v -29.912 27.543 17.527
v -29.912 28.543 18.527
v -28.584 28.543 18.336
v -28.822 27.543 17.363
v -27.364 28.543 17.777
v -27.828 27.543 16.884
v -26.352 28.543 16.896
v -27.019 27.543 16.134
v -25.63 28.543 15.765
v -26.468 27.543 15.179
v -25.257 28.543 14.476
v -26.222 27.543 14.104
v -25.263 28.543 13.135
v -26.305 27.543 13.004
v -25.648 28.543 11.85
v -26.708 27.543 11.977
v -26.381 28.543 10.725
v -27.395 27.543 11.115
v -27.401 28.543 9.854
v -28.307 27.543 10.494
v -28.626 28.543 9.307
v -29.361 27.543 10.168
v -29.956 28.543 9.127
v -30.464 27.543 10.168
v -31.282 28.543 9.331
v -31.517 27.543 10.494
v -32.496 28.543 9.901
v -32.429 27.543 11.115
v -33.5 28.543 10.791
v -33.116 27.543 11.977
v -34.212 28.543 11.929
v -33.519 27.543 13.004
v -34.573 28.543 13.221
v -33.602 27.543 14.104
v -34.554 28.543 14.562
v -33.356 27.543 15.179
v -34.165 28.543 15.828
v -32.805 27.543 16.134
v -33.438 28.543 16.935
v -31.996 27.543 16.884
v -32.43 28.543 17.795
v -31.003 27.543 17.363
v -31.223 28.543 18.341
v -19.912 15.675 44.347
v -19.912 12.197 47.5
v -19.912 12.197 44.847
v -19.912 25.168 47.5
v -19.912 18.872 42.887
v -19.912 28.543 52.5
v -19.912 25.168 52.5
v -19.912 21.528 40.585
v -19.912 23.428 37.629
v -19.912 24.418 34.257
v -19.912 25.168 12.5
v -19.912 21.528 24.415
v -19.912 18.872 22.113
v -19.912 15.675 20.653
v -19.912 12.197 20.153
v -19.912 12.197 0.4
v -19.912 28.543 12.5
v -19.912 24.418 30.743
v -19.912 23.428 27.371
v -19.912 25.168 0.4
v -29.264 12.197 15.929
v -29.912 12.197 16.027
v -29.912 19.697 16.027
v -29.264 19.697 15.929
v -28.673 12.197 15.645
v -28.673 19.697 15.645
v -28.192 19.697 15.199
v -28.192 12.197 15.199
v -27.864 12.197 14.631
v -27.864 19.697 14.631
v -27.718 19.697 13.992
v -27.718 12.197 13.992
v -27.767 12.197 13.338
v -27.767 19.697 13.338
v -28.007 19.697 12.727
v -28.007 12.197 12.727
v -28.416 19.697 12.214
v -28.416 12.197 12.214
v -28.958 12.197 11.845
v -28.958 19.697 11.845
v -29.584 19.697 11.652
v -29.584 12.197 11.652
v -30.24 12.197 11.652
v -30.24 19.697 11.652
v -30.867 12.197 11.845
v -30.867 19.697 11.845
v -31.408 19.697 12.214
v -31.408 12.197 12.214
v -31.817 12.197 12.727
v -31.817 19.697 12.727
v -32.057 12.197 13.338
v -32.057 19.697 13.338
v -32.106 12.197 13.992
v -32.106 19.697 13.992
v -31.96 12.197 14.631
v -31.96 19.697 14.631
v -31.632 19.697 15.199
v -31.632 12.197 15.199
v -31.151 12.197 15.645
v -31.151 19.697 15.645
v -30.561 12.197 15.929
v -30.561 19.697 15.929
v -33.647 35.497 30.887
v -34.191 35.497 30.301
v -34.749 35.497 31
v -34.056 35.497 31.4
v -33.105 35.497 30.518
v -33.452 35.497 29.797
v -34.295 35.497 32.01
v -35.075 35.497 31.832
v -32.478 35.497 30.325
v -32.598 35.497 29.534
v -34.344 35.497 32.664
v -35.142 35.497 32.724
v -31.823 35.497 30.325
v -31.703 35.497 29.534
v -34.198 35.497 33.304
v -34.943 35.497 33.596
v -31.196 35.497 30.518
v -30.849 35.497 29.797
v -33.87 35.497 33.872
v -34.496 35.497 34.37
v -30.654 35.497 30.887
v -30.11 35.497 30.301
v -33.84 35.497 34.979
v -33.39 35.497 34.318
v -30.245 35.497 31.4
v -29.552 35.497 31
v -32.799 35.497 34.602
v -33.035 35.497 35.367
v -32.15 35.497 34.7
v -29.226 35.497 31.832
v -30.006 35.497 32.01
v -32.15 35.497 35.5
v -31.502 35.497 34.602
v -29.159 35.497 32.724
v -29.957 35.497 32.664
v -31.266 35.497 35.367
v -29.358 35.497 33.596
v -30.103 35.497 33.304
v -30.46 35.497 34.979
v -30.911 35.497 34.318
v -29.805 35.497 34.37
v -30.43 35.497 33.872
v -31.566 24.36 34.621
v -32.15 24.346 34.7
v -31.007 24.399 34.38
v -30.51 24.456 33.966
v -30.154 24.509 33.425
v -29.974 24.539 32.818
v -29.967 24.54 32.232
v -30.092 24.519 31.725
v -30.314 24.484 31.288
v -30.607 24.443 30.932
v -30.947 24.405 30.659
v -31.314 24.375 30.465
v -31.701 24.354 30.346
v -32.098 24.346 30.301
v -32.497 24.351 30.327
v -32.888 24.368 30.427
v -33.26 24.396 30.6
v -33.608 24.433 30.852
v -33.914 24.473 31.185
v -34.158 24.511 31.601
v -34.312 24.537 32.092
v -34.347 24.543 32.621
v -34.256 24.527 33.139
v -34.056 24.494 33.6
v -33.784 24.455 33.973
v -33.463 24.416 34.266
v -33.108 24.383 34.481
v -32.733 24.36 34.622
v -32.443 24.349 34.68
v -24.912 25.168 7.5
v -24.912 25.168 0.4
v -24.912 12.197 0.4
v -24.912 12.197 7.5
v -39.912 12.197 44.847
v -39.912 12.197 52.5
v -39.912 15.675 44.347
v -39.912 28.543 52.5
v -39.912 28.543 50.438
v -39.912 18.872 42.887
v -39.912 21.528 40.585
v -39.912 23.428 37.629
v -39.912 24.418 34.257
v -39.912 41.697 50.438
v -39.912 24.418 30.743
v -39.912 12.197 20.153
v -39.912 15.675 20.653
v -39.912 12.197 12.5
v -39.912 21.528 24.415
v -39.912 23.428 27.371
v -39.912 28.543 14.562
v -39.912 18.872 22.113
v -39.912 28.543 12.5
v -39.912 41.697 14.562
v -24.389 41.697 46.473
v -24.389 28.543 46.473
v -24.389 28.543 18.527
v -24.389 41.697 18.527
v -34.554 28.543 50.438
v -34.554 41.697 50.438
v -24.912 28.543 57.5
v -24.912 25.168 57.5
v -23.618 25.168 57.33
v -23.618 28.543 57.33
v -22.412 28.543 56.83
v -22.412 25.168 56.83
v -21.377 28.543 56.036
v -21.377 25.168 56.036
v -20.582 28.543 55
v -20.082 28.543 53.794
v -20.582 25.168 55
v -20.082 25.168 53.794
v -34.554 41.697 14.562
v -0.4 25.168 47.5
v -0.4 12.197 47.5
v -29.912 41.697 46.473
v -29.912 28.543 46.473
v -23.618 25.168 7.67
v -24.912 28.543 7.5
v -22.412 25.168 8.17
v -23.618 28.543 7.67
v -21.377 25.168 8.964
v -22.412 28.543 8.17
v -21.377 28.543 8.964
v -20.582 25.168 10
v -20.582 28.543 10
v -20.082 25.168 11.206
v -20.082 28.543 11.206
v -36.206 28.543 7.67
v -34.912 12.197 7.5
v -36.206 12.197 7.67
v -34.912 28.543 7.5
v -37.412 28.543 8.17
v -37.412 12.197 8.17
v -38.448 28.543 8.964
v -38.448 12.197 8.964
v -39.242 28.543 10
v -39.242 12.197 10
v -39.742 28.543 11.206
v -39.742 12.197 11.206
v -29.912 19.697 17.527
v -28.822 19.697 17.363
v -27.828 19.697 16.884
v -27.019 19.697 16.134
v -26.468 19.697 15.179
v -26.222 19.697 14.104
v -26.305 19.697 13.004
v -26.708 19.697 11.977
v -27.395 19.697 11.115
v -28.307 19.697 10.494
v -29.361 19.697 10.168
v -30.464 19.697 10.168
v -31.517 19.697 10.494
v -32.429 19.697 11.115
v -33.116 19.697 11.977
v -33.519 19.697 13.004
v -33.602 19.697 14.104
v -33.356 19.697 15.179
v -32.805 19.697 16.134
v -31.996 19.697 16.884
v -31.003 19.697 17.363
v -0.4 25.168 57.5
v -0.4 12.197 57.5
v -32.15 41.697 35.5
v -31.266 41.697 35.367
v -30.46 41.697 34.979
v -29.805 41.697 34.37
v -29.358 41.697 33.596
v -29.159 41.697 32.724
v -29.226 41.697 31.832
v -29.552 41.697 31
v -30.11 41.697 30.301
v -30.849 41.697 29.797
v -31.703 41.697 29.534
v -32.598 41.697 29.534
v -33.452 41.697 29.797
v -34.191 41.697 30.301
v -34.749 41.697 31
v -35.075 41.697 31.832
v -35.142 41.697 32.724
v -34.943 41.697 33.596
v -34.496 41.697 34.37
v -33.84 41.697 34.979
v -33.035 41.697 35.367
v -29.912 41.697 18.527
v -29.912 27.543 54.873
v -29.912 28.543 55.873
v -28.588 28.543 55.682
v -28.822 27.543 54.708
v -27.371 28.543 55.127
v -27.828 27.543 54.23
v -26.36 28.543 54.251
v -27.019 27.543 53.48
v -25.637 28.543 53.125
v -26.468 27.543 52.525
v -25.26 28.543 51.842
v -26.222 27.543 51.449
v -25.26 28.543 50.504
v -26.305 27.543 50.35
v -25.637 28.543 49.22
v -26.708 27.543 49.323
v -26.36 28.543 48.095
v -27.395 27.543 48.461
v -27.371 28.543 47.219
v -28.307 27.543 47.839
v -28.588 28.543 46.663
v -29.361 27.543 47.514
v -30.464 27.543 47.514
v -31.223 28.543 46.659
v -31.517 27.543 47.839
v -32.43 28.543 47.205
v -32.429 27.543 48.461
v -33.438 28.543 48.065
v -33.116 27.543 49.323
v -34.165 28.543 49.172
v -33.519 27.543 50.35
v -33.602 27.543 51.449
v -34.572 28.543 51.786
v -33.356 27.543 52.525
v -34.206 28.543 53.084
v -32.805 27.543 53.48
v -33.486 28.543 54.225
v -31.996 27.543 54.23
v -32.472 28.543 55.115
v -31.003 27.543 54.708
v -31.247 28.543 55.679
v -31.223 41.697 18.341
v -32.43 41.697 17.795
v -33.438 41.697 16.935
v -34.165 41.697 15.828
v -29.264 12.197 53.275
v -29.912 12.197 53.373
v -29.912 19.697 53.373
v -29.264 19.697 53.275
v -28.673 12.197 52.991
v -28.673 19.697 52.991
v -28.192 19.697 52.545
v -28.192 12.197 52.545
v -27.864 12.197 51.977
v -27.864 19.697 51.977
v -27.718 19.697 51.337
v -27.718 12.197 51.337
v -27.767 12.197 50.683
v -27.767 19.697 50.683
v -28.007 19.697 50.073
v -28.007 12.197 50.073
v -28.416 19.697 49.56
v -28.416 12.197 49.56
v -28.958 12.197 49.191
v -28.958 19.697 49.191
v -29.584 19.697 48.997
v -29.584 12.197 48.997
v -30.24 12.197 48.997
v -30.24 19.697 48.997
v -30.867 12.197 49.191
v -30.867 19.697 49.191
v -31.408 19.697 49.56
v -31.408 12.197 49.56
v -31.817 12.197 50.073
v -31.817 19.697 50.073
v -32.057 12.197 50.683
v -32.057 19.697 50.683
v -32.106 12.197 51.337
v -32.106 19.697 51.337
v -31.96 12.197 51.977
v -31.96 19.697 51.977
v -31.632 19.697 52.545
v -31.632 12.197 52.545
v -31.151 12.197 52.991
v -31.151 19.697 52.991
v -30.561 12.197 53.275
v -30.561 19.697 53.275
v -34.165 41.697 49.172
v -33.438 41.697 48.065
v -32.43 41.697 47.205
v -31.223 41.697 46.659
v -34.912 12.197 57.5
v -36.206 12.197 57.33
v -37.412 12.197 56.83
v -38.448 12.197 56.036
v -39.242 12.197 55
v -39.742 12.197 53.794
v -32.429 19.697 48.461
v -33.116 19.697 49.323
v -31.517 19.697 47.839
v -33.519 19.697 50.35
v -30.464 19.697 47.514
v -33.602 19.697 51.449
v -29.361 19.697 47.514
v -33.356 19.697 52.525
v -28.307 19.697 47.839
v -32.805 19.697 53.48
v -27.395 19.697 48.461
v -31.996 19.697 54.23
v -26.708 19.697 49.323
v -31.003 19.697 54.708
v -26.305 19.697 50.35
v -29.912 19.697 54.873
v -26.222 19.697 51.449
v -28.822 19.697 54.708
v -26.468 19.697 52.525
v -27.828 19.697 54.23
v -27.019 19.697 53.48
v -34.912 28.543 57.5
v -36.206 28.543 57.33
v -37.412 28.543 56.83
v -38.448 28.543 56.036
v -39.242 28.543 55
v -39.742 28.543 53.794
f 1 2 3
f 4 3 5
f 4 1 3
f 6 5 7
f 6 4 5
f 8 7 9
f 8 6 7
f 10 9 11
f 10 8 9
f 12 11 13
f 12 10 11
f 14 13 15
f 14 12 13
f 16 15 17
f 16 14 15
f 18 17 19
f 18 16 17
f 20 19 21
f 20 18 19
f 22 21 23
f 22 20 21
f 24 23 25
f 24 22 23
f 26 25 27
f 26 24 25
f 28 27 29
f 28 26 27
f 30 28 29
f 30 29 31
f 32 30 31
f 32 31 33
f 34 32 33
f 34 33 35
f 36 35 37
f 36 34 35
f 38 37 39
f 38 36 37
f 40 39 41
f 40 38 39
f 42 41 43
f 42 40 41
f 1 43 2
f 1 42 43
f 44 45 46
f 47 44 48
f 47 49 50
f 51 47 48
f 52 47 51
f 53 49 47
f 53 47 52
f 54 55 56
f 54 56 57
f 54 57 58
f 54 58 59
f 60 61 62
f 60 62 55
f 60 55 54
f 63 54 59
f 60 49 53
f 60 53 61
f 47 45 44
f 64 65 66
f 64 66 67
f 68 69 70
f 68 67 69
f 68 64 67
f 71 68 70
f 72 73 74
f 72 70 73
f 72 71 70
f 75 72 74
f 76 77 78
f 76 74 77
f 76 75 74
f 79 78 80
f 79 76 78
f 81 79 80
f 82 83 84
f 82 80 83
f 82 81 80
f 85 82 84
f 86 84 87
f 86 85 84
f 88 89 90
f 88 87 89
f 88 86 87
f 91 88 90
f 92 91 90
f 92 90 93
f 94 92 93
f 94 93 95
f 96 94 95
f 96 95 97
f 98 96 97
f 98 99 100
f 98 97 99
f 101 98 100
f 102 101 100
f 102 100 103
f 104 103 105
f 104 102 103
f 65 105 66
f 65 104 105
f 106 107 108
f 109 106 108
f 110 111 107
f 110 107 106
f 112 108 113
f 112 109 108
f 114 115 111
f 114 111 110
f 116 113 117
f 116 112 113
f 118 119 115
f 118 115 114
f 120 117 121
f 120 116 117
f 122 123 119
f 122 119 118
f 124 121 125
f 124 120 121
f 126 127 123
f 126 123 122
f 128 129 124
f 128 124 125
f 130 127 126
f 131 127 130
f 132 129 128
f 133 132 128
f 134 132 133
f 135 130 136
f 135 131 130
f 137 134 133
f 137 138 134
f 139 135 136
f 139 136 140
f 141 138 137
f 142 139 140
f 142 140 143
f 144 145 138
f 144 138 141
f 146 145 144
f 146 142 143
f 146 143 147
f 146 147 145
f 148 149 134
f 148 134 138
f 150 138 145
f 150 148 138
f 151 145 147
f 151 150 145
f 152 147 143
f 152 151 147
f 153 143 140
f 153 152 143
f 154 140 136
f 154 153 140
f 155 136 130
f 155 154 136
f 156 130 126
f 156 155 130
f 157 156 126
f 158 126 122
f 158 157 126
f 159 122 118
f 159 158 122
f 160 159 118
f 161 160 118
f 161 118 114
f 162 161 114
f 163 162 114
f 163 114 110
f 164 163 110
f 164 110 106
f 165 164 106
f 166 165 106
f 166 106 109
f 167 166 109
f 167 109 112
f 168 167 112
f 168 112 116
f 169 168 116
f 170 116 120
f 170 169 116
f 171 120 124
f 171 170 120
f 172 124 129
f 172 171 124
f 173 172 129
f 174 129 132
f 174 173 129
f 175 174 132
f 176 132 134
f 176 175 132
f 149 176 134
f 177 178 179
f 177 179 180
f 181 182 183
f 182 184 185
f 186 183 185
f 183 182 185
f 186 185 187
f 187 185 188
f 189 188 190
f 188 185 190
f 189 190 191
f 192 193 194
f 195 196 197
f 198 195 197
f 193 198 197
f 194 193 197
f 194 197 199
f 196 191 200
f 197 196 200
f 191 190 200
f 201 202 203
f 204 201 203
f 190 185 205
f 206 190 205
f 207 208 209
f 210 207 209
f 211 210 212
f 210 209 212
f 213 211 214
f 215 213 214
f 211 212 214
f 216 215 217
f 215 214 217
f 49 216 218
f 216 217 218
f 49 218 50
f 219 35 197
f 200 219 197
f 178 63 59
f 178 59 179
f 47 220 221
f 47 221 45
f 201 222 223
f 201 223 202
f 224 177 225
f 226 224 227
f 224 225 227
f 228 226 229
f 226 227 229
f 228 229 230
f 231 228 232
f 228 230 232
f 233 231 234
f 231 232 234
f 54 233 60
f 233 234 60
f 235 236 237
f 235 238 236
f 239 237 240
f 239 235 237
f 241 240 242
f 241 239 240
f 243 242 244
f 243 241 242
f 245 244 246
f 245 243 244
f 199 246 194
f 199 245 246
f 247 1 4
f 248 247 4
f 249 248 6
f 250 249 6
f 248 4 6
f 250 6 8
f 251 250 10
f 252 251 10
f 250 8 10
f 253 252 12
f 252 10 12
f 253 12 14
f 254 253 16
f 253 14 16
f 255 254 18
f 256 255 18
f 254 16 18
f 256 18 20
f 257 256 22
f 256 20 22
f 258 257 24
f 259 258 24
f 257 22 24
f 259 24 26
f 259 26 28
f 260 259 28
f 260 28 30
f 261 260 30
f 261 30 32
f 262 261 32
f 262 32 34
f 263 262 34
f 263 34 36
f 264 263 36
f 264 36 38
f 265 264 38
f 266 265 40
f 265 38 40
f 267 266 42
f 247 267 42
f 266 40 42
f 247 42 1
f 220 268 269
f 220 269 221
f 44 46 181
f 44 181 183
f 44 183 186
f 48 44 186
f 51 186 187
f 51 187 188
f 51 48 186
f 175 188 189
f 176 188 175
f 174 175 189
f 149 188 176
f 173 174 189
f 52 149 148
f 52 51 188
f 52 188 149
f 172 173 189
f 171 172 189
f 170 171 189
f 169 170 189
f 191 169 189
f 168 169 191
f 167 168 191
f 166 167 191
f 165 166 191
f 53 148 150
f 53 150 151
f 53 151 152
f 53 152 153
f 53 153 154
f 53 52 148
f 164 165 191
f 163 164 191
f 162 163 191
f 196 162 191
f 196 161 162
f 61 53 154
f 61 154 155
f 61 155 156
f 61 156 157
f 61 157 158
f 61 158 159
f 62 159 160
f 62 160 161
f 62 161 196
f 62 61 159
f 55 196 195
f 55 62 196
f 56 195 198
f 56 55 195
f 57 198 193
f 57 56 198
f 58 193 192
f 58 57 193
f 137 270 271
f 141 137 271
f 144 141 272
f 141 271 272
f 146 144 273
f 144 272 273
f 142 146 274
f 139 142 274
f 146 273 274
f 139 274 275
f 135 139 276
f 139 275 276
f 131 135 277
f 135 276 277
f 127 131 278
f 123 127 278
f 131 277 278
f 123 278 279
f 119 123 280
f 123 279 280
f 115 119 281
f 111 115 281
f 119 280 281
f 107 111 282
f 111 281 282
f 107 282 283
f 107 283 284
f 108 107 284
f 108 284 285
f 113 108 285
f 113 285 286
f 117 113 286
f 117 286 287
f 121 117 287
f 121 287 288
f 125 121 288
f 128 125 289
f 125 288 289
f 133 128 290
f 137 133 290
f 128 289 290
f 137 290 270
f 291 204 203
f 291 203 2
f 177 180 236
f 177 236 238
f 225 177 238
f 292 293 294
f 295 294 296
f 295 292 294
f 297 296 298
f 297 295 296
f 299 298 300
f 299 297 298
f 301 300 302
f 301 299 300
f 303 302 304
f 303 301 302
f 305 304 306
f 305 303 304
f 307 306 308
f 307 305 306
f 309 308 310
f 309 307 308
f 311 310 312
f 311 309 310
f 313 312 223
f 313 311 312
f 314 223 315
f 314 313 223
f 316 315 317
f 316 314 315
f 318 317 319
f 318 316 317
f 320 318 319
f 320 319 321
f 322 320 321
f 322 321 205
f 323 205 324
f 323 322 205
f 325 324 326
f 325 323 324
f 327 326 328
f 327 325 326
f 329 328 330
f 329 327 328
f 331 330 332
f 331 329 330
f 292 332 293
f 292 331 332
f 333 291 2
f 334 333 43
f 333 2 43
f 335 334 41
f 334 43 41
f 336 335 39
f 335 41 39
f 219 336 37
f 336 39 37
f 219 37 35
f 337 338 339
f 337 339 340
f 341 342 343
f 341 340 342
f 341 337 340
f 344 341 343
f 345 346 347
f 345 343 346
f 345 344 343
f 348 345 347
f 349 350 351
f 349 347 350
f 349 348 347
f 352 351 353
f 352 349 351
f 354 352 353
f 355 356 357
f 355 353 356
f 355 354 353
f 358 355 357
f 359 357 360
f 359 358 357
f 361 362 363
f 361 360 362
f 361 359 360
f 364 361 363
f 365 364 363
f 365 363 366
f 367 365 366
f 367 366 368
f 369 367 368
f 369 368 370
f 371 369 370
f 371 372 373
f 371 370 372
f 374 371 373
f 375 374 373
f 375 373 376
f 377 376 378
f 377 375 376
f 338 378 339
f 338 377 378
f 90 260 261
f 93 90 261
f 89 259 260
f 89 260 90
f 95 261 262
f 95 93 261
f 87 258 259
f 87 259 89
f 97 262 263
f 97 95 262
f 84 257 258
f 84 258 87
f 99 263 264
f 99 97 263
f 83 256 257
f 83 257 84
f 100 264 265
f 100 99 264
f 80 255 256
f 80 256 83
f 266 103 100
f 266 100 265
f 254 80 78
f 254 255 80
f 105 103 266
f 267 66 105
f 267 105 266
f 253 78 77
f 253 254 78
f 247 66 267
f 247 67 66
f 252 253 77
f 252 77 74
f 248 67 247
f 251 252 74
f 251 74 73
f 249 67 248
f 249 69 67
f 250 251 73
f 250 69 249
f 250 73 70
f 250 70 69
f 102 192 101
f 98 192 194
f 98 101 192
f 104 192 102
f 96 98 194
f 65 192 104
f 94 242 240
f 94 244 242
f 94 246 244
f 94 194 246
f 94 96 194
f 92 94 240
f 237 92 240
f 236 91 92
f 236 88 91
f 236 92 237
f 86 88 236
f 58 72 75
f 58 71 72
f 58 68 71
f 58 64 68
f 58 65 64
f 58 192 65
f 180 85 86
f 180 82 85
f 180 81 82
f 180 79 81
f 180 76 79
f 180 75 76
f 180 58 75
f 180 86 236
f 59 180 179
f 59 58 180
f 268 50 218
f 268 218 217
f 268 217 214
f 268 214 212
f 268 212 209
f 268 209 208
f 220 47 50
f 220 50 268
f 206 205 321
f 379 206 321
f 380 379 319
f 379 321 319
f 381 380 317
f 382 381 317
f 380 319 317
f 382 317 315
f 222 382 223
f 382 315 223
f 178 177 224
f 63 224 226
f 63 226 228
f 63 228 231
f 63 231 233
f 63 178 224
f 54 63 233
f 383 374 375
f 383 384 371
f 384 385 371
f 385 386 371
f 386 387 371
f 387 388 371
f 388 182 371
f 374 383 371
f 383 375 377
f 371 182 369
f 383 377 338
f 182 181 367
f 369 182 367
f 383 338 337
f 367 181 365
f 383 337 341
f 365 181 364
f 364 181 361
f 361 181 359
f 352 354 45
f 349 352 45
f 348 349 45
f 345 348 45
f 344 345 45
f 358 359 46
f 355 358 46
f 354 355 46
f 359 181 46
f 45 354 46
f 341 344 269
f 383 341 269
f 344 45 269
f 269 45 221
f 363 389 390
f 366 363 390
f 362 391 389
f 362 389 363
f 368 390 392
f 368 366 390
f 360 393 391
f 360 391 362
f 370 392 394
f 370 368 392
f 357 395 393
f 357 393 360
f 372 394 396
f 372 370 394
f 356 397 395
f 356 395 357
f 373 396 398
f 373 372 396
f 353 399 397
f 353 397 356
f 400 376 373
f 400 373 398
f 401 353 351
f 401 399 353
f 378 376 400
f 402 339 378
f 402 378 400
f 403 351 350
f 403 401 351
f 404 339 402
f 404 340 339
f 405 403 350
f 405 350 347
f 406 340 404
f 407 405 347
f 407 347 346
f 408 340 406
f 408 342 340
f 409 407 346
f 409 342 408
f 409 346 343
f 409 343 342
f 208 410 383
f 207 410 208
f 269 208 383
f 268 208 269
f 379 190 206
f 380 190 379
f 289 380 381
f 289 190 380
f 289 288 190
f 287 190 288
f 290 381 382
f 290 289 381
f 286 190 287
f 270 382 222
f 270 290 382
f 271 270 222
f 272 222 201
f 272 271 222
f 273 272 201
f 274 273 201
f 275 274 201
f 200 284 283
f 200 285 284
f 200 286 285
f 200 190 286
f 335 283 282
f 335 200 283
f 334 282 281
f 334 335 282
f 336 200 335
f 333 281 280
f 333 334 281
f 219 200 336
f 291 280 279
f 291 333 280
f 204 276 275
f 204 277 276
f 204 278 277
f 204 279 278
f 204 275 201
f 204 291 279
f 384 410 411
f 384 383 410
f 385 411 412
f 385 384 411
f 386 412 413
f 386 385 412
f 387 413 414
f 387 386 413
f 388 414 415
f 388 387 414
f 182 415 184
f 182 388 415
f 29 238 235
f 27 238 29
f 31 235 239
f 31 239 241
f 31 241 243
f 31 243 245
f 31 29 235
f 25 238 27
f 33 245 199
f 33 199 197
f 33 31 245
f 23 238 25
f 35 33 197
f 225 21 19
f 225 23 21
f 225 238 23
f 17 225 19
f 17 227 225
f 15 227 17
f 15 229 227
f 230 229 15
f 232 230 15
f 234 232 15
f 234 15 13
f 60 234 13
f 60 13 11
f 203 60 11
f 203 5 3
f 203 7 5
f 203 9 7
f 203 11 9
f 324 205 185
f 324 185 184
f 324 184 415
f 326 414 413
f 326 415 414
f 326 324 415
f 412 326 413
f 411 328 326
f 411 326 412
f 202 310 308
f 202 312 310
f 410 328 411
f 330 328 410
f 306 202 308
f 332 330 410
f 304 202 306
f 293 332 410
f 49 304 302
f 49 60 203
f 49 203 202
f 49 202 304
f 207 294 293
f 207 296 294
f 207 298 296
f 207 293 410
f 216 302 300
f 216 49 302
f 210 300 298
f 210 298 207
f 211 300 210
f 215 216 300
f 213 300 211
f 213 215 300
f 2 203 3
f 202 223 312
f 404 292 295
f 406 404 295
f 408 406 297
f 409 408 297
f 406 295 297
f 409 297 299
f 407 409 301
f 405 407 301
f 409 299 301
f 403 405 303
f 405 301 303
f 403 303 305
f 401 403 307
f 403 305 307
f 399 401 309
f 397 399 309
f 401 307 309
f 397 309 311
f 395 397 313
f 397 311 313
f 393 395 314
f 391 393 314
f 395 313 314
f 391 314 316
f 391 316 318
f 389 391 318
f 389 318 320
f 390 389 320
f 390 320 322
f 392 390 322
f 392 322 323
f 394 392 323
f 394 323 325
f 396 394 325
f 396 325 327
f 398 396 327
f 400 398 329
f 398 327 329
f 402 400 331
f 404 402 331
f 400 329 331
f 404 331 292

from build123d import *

# Parameters (mm, degrees)
BOSS_EXTRUDE1_DEPTH     = 20
FILLET1_R               = 5
CUT_EXTRUDE1_DEPTH      = 72.877952398
CUT_EXTRUDE1_DEPTH_BACK = 72.877952398
SKETCH2_R               = 2.2
SKETCH3_R               = 3.7
CUT_EXTRUDE2_DEPTH      = 8.846664929
CHAMFER2_SIZE           = 1
BOSS_EXTRUDE2_START     = -3.375
BOSS_EXTRUDE2_DEPTH     = 12.971664929
BOSS_EXTRUDE3_DEPTH     = 13.153335071
SKETCH6_R               = 3
CUT_EXTRUDE3_DEPTH      = 6.2
CUT_EXTRUDE4_DEPTH      = 74.770702766
CUT_EXTRUDE4_DEPTH_BACK = 74.770702766
SKETCH7_R               = 2.2


with BuildPart() as part:
    # Sketch1 → Boss-Extrude1 (new body)
    with BuildSketch(Plane(origin=(-19.912110777, 0, 0), x_dir=(0, 0, -1), z_dir=(1, 0, 0))):
        with BuildLine():
            Line((-52.5, 12.196664929), (-44.846664929, 12.196664929))
            ThreePointArc((-44.846664929, 12.196664929), (-32.5, 24.543329858), (-20.153335071, 12.196664929))
            Line((-20.153335071, 12.196664929), (-7.5, 12.196664929))
            Line((-7.5, 12.196664929), (-7.5, 28.543329858))
            Line((-7.5, 28.543329858), (-57.5, 28.543329858))
            Line((-57.5, 28.543329858), (-57.5, 12.196664929))
            Line((-57.5, 12.196664929), (-52.5, 12.196664929))
        make_face()
    extrude(amount=-BOSS_EXTRUDE1_DEPTH)

    # Fillet1
    fillet1_edges = [part.edges().sort_by_distance(p)[0] for p in [
        (-39.912110777, 20.369997393, 7.5),
        (-39.912110777, 20.369997393, 57.5),
        (-19.912110777, 20.369997393, 57.5),
        (-19.912110777, 20.369997393, 7.5),
    ]]
    fillet(fillet1_edges, radius=FILLET1_R)

    # Sketch2 → Cut-Extrude1 (cut, two sides: drawn at the far end of the back side and taken through both)
    with BuildSketch(Plane(origin=(0, 28.543329858, 0), x_dir=(1, 0, 0), z_dir=(0, 1, 0)).offset(-CUT_EXTRUDE1_DEPTH_BACK)):
        with Locations(Location((-29.912110777, -51.172876859, 0), (0, 0, 270))):
            Circle(SKETCH2_R)
        with Locations(Location((-29.912110777, -13.827123141, 0), (0, 0, 270))):
            Circle(SKETCH2_R)
    extrude(amount=CUT_EXTRUDE1_DEPTH + CUT_EXTRUDE1_DEPTH_BACK, mode=Mode.SUBTRACT)

    # Sketch3 → Cut-Extrude2 (cut)
    with BuildSketch(Plane(origin=(0, 28.543329858, 0), x_dir=(1, 0, 0), z_dir=(0, 1, 0))):
        with Locations(Location((-29.912110777, -51.172876859, 0), (0, 0, 270))):
            Circle(SKETCH3_R)
        with Locations(Location((-29.912110777, -13.827123141, 0), (0, 0, 270))):
            Circle(SKETCH3_R)
    extrude(amount=-CUT_EXTRUDE2_DEPTH, mode=Mode.SUBTRACT)

    # Chamfer2
    chamfer2_edges = [part.edges().sort_by_distance(p)[0] for p in [
        (-29.912110777, 28.543329858, 47.472876859),
        (-29.912110777, 28.543329858, 10.127123141),
    ]]
    chamfer(chamfer2_edges, length=CHAMFER2_SIZE)

    # Sketch4 → Boss-Extrude2 (add)
    with BuildSketch(Plane(origin=(0, 28.543329858, 0), x_dir=(1, 0, 0), z_dir=(0, 1, 0)).offset(BOSS_EXTRUDE2_START)):
        with BuildLine():
            Line((-0.4, -47.5), (-19.912110777, -47.5))
            Line((-19.912110777, -47.5), (-19.912110777, -52.5))
            ThreePointArc((-19.912110777, -52.5), (-21.376576871, -56.035533906), (-24.912110777, -57.5))
            Line((-24.912110777, -57.5), (-0.4, -57.5))
            Line((-0.4, -57.5), (-0.4, -47.5))
        make_face()
        with BuildLine():
            Line((-19.912110777, -0.4), (-24.912110777, -0.4))
            Line((-24.912110777, -0.4), (-24.912110777, -7.5))
            ThreePointArc((-24.912110777, -7.5), (-21.376576871, -8.964466094), (-19.912110777, -12.5))
            Line((-19.912110777, -12.5), (-19.912110777, -0.4))
        make_face()
    extrude(amount=-BOSS_EXTRUDE2_DEPTH)

    # Sketch5 → Boss-Extrude3 (add)
    with BuildSketch(Plane(origin=(0, 28.543329858, 0), x_dir=(1, 0, 0), z_dir=(0, 1, 0))):
        with BuildLine():
            Line((-29.912110777, -46.472876859), (-24.38878903, -46.472876859))
            Line((-24.38878903, -46.472876859), (-24.38878903, -18.527123141))
            Line((-24.38878903, -18.527123141), (-29.912110777, -18.527123141))
            ThreePointArc((-29.912110777, -18.527123141), (-32.964467867, -17.401072804), (-34.554225923, -14.562491734))
            Line((-34.554225923, -14.562491734), (-39.912110777, -14.562491734))
            Line((-39.912110777, -14.562491734), (-39.912110777, -50.437508266))
            Line((-39.912110777, -50.437508266), (-34.554225923, -50.437508266))
            ThreePointArc((-34.554225923, -50.437508266), (-32.964467867, -47.598927196), (-29.912110777, -46.472876859))
        make_face()
    extrude(amount=BOSS_EXTRUDE3_DEPTH)

    # Sketch6 → Cut-Extrude3 (cut)
    with BuildSketch(Plane(origin=(0, 41.696664929, 0), x_dir=(1, 0, 0), z_dir=(0, 1, 0))):
        with Locations(Location((-32.150449903, -32.5, 0), (0, 0, 270))):
            Circle(SKETCH6_R)
    extrude(amount=-CUT_EXTRUDE3_DEPTH, mode=Mode.SUBTRACT)

    # Sketch7 → Cut-Extrude4 (cut, two sides: drawn at the far end of the back side and taken through both)
    with BuildSketch(Plane(origin=(0, 35.496664929, 0), x_dir=(1, 0, 0), z_dir=(0, 1, 0)).offset(-CUT_EXTRUDE4_DEPTH_BACK)):
        with Locations(Location((-32.150449903, -32.5, 0), (0, 0, 270))):
            Circle(SKETCH7_R)
    extrude(amount=CUT_EXTRUDE4_DEPTH + CUT_EXTRUDE4_DEPTH_BACK, mode=Mode.SUBTRACT)


solid = part.part
